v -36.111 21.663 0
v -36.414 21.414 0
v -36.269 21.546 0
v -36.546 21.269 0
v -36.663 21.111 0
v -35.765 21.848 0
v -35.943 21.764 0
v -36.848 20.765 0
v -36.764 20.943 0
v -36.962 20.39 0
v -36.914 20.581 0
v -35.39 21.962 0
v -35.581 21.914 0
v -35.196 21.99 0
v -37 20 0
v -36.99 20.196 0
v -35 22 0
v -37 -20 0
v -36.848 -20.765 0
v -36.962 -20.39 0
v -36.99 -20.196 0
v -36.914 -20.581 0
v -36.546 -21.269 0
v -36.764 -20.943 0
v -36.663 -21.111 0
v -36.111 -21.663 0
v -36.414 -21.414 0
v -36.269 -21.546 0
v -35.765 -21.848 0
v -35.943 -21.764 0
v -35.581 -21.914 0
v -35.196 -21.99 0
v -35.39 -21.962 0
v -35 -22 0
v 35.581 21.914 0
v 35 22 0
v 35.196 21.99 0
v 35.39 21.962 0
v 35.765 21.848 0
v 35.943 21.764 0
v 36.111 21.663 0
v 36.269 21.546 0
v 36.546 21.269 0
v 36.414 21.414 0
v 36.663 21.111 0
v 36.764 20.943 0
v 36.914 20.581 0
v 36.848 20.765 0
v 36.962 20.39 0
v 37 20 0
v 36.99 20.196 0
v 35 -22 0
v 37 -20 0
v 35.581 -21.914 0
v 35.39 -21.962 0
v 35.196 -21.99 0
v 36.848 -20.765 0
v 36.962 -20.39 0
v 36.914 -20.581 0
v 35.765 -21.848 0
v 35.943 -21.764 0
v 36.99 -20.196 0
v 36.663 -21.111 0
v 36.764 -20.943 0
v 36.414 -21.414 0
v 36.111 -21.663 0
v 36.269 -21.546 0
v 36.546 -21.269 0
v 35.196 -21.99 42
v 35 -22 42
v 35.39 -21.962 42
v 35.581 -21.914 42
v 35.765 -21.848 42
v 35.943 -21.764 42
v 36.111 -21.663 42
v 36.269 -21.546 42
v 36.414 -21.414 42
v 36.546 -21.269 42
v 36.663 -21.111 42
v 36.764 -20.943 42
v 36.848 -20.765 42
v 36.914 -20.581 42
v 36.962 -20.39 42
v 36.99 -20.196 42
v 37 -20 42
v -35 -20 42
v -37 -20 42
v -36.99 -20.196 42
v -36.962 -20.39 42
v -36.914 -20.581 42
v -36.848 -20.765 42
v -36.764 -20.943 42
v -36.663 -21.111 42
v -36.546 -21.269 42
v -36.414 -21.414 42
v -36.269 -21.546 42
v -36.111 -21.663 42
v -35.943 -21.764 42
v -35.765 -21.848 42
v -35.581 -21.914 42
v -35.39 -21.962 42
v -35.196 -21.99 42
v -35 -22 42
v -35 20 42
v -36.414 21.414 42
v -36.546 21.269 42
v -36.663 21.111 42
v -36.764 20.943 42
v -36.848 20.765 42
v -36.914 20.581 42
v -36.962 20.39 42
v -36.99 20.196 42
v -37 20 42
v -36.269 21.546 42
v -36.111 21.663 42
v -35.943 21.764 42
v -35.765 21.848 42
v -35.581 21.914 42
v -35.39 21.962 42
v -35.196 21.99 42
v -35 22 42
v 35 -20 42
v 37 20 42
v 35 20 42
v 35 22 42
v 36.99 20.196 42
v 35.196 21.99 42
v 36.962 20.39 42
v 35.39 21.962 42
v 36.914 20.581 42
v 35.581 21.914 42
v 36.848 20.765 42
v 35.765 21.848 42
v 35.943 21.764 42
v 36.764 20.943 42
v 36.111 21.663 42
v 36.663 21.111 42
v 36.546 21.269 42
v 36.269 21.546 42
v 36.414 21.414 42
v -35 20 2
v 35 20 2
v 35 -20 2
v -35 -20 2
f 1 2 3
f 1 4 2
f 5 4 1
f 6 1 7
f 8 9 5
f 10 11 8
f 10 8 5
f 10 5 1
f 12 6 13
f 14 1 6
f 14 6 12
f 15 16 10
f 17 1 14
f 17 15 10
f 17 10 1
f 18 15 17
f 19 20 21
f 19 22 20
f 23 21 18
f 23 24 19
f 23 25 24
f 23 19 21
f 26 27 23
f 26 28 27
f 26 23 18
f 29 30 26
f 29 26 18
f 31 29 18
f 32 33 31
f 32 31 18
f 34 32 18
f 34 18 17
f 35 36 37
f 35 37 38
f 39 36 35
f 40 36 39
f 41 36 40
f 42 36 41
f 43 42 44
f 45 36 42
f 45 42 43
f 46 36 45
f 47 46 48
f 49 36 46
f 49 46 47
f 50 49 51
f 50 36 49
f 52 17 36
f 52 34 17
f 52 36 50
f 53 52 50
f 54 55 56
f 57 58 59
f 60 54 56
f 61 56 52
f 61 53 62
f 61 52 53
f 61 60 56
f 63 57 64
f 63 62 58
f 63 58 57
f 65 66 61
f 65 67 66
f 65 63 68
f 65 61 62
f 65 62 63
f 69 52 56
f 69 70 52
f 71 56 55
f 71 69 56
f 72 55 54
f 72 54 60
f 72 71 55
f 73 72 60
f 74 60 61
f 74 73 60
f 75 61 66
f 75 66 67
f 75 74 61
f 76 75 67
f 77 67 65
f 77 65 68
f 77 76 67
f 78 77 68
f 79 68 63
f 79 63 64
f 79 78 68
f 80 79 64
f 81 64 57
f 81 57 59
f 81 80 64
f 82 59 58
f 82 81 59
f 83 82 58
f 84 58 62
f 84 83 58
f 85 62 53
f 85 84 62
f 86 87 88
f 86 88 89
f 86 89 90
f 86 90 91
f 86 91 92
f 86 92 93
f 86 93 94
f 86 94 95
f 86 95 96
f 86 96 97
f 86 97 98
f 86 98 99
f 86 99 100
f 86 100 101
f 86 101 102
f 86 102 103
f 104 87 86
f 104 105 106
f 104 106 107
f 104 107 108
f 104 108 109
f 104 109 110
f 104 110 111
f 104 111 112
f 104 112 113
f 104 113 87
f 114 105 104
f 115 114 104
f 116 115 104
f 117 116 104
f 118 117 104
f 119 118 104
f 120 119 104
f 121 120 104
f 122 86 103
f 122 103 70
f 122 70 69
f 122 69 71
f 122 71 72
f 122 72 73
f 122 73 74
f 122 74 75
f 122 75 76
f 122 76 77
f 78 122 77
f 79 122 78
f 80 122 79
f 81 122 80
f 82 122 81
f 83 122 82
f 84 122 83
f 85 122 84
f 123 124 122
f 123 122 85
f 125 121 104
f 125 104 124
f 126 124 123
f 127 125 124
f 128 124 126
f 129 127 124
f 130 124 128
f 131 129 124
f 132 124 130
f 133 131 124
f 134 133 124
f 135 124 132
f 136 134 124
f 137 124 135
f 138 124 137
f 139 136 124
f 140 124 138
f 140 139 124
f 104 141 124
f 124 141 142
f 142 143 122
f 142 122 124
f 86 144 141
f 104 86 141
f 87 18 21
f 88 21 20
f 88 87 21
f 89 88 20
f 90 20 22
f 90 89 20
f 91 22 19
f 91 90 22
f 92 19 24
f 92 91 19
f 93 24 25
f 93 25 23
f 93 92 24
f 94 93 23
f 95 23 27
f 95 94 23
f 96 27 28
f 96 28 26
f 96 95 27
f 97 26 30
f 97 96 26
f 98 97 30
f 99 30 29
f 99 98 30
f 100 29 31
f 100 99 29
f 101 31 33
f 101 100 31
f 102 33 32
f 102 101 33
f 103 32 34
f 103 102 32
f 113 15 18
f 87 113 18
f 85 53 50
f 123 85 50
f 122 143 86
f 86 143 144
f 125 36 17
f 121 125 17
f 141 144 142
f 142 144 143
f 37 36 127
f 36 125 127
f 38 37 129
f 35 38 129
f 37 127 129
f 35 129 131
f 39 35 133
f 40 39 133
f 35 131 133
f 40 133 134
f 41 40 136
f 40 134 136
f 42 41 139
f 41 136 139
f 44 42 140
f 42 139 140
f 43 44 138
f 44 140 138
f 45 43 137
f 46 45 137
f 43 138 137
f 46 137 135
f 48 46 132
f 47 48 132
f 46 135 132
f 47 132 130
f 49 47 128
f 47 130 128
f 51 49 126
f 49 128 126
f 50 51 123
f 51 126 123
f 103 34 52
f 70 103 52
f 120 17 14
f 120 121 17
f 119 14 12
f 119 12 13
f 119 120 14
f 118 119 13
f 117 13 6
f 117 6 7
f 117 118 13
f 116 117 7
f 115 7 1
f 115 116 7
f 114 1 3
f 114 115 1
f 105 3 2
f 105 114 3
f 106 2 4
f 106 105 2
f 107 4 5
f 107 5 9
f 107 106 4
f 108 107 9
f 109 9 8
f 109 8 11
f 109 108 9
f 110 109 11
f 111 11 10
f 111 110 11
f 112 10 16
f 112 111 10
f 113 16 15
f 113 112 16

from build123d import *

# Parameters (mm, degrees)
F0_W     = 2
F0_H     = 40
F1_DEPTH = 42
F2_W     = 70
F2_H     = 40
F3_DEPTH = 2
F4_R     = 2


with BuildPart() as f1:
    # F0 (on Top) → F1 (new body)
    with BuildSketch(Plane.XY):
        Polygon((-37, 20), (-35, 20), (35, 20), (37, 20), (37, 22), (-37, 22), align=None)
        with Locations((-36, 0)):
            Rectangle(F0_W, F0_H)
        Polygon((35, -20), (-35, -20), (-37, -20), (-37, -22), (37, -22), (37, -20), align=None)
        with Locations((36, 0)):
            Rectangle(F0_W, F0_H)
    extrude(amount=F1_DEPTH)

    # F2 (on face) → F3 (join)
    with BuildSketch(Plane(origin=(0, 0, 0), x_dir=(1, 0, 0), z_dir=(0, 0, -1))):
        Rectangle(F2_W, F2_H)
    extrude(amount=-F3_DEPTH)

    # F4
    f4_edges = [f1.edges().sort_by_distance(p)[0] for p in [
        (37, -22, 21),
        (37, 22, 21),
        (-37, -22, 21),
        (-37, 22, 21),
    ]]
    fillet(f4_edges, radius=F4_R)


solid = f1.part
